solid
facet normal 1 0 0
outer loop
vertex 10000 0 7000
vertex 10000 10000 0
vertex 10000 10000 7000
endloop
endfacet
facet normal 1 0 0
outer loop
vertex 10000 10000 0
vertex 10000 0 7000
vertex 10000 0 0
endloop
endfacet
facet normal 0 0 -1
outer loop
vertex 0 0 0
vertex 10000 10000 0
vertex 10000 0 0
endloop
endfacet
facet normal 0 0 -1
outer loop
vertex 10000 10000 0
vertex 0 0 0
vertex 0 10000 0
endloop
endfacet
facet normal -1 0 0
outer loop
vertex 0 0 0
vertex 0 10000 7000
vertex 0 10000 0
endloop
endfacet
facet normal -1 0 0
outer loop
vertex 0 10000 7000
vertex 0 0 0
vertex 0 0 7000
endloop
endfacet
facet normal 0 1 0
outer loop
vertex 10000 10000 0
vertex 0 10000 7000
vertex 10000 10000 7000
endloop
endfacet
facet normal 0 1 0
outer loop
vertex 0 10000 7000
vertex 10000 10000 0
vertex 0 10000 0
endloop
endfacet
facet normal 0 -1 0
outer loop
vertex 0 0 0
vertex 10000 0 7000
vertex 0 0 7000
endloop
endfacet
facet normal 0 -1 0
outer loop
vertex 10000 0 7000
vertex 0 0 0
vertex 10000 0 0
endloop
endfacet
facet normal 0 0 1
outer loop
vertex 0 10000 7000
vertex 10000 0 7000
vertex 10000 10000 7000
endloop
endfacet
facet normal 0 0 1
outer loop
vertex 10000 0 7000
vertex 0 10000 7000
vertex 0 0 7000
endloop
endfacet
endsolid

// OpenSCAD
// Spaceplate Layer Stack
width = 10000; // 10 microns width
depth = 10000; // 10 microns depth

// Layer 0: TiO2_0
color([0.2, 0.5733333333333333, 0.5666666666666668, 0.8])
translate([0, 0, 0.0])
cube([width, depth, 150.0]);
// Layer 1: SiO2_0
color([0.2, 0.32, 0.7250000000000001, 0.8])
translate([0, 0, 150.0])
cube([width, depth, 200.0]);
// Layer 2: TiO2_1
color([0.2, 0.5733333333333333, 0.5666666666666668, 0.8])
translate([0, 0, 350.0])
cube([width, depth, 150.0]);
// Layer 3: SiO2_1
color([0.2, 0.32, 0.7250000000000001, 0.8])
translate([0, 0, 500.0])
cube([width, depth, 200.0]);
// Layer 4: TiO2_2
color([0.2, 0.5733333333333333, 0.5666666666666668, 0.8])
translate([0, 0, 700.0])
cube([width, depth, 150.0]);
// Layer 5: SiO2_2
color([0.2, 0.32, 0.7250000000000001, 0.8])
translate([0, 0, 850.0])
cube([width, depth, 200.0]);
// Layer 6: TiO2_3
color([0.2, 0.5733333333333333, 0.5666666666666668, 0.8])
translate([0, 0, 1050.0])
cube([width, depth, 150.0]);
// Layer 7: SiO2_3
color([0.2, 0.32, 0.7250000000000001, 0.8])
translate([0, 0, 1200.0])
cube([width, depth, 200.0]);
// Layer 8: TiO2_4
color([0.2, 0.5733333333333333, 0.5666666666666668, 0.8])
translate([0, 0, 1400.0])
cube([width, depth, 150.0]);
// Layer 9: SiO2_4
color([0.2, 0.32, 0.7250000000000001, 0.8])
translate([0, 0, 1550.0])
cube([width, depth, 200.0]);
// Layer 10: TiO2_5
color([0.2, 0.5733333333333333, 0.5666666666666668, 0.8])
translate([0, 0, 1750.0])
cube([width, depth, 150.0]);
// Layer 11: SiO2_5
color([0.2, 0.32, 0.7250000000000001, 0.8])
translate([0, 0, 1900.0])
cube([width, depth, 200.0]);
// Layer 12: TiO2_6
color([0.2, 0.5733333333333333, 0.5666666666666668, 0.8])
translate([0, 0, 2100.0])
cube([width, depth, 150.0]);
// Layer 13: SiO2_6
color([0.2, 0.32, 0.7250000000000001, 0.8])
translate([0, 0, 2250.0])
cube([width, depth, 200.0]);
// Layer 14: TiO2_7
color([0.2, 0.5733333333333333, 0.5666666666666668, 0.8])
translate([0, 0, 2450.0])
cube([width, depth, 150.0]);
// Layer 15: SiO2_7
color([0.2, 0.32, 0.7250000000000001, 0.8])
translate([0, 0, 2600.0])
cube([width, depth, 200.0]);
// Layer 16: TiO2_8
color([0.2, 0.5733333333333333, 0.5666666666666668, 0.8])
translate([0, 0, 2800.0])
cube([width, depth, 150.0]);
// Layer 17: SiO2_8
color([0.2, 0.32, 0.7250000000000001, 0.8])
translate([0, 0, 2950.0])
cube([width, depth, 200.0]);
// Layer 18: TiO2_9
color([0.2, 0.5733333333333333, 0.5666666666666668, 0.8])
translate([0, 0, 3150.0])
cube([width, depth, 150.0]);
// Layer 19: SiO2_9
color([0.2, 0.32, 0.7250000000000001, 0.8])
translate([0, 0, 3300.0])
cube([width, depth, 200.0]);
// Layer 20: TiO2_10
color([0.2, 0.5733333333333333, 0.5666666666666668, 0.8])
translate([0, 0, 3500.0])
cube([width, depth, 150.0]);
// Layer 21: SiO2_10
color([0.2, 0.32, 0.7250000000000001, 0.8])
translate([0, 0, 3650.0])
cube([width, depth, 200.0]);
// Layer 22: TiO2_11
color([0.2, 0.5733333333333333, 0.5666666666666668, 0.8])
translate([0, 0, 3850.0])
cube([width, depth, 150.0]);
// Layer 23: SiO2_11
color([0.2, 0.32, 0.7250000000000001, 0.8])
translate([0, 0, 4000.0])
cube([width, depth, 200.0]);
// Layer 24: TiO2_12
color([0.2, 0.5733333333333333, 0.5666666666666668, 0.8])
translate([0, 0, 4200.0])
cube([width, depth, 150.0]);
// Layer 25: SiO2_12
color([0.2, 0.32, 0.7250000000000001, 0.8])
translate([0, 0, 4350.0])
cube([width, depth, 200.0]);
// Layer 26: TiO2_13
color([0.2, 0.5733333333333333, 0.5666666666666668, 0.8])
translate([0, 0, 4550.0])
cube([width, depth, 150.0]);
// Layer 27: SiO2_13
color([0.2, 0.32, 0.7250000000000001, 0.8])
translate([0, 0, 4700.0])
cube([width, depth, 200.0]);
// Layer 28: TiO2_14
color([0.2, 0.5733333333333333, 0.5666666666666668, 0.8])
translate([0, 0, 4900.0])
cube([width, depth, 150.0]);
// Layer 29: SiO2_14
color([0.2, 0.32, 0.7250000000000001, 0.8])
translate([0, 0, 5050.0])
cube([width, depth, 200.0]);
// Layer 30: TiO2_15
color([0.2, 0.5733333333333333, 0.5666666666666668, 0.8])
translate([0, 0, 5250.0])
cube([width, depth, 150.0]);
// Layer 31: SiO2_15
color([0.2, 0.32, 0.7250000000000001, 0.8])
translate([0, 0, 5400.0])
cube([width, depth, 200.0]);
// Layer 32: TiO2_16
color([0.2, 0.5733333333333333, 0.5666666666666668, 0.8])
translate([0, 0, 5600.0])
cube([width, depth, 150.0]);
// Layer 33: SiO2_16
color([0.2, 0.32, 0.7250000000000001, 0.8])
translate([0, 0, 5750.0])
cube([width, depth, 200.0]);
// Layer 34: TiO2_17
color([0.2, 0.5733333333333333, 0.5666666666666668, 0.8])
translate([0, 0, 5950.0])
cube([width, depth, 150.0]);
// Layer 35: SiO2_17
color([0.2, 0.32, 0.7250000000000001, 0.8])
translate([0, 0, 6100.0])
cube([width, depth, 200.0]);
// Layer 36: TiO2_18
color([0.2, 0.5733333333333333, 0.5666666666666668, 0.8])
translate([0, 0, 6300.0])
cube([width, depth, 150.0]);
// Layer 37: SiO2_18
color([0.2, 0.32, 0.7250000000000001, 0.8])
translate([0, 0, 6450.0])
cube([width, depth, 200.0]);
// Layer 38: TiO2_19
color([0.2, 0.5733333333333333, 0.5666666666666668, 0.8])
translate([0, 0, 6650.0])
cube([width, depth, 150.0]);
// Layer 39: SiO2_19
color([0.2, 0.32, 0.7250000000000001, 0.8])
translate([0, 0, 6800.0])
cube([width, depth, 200.0]);
